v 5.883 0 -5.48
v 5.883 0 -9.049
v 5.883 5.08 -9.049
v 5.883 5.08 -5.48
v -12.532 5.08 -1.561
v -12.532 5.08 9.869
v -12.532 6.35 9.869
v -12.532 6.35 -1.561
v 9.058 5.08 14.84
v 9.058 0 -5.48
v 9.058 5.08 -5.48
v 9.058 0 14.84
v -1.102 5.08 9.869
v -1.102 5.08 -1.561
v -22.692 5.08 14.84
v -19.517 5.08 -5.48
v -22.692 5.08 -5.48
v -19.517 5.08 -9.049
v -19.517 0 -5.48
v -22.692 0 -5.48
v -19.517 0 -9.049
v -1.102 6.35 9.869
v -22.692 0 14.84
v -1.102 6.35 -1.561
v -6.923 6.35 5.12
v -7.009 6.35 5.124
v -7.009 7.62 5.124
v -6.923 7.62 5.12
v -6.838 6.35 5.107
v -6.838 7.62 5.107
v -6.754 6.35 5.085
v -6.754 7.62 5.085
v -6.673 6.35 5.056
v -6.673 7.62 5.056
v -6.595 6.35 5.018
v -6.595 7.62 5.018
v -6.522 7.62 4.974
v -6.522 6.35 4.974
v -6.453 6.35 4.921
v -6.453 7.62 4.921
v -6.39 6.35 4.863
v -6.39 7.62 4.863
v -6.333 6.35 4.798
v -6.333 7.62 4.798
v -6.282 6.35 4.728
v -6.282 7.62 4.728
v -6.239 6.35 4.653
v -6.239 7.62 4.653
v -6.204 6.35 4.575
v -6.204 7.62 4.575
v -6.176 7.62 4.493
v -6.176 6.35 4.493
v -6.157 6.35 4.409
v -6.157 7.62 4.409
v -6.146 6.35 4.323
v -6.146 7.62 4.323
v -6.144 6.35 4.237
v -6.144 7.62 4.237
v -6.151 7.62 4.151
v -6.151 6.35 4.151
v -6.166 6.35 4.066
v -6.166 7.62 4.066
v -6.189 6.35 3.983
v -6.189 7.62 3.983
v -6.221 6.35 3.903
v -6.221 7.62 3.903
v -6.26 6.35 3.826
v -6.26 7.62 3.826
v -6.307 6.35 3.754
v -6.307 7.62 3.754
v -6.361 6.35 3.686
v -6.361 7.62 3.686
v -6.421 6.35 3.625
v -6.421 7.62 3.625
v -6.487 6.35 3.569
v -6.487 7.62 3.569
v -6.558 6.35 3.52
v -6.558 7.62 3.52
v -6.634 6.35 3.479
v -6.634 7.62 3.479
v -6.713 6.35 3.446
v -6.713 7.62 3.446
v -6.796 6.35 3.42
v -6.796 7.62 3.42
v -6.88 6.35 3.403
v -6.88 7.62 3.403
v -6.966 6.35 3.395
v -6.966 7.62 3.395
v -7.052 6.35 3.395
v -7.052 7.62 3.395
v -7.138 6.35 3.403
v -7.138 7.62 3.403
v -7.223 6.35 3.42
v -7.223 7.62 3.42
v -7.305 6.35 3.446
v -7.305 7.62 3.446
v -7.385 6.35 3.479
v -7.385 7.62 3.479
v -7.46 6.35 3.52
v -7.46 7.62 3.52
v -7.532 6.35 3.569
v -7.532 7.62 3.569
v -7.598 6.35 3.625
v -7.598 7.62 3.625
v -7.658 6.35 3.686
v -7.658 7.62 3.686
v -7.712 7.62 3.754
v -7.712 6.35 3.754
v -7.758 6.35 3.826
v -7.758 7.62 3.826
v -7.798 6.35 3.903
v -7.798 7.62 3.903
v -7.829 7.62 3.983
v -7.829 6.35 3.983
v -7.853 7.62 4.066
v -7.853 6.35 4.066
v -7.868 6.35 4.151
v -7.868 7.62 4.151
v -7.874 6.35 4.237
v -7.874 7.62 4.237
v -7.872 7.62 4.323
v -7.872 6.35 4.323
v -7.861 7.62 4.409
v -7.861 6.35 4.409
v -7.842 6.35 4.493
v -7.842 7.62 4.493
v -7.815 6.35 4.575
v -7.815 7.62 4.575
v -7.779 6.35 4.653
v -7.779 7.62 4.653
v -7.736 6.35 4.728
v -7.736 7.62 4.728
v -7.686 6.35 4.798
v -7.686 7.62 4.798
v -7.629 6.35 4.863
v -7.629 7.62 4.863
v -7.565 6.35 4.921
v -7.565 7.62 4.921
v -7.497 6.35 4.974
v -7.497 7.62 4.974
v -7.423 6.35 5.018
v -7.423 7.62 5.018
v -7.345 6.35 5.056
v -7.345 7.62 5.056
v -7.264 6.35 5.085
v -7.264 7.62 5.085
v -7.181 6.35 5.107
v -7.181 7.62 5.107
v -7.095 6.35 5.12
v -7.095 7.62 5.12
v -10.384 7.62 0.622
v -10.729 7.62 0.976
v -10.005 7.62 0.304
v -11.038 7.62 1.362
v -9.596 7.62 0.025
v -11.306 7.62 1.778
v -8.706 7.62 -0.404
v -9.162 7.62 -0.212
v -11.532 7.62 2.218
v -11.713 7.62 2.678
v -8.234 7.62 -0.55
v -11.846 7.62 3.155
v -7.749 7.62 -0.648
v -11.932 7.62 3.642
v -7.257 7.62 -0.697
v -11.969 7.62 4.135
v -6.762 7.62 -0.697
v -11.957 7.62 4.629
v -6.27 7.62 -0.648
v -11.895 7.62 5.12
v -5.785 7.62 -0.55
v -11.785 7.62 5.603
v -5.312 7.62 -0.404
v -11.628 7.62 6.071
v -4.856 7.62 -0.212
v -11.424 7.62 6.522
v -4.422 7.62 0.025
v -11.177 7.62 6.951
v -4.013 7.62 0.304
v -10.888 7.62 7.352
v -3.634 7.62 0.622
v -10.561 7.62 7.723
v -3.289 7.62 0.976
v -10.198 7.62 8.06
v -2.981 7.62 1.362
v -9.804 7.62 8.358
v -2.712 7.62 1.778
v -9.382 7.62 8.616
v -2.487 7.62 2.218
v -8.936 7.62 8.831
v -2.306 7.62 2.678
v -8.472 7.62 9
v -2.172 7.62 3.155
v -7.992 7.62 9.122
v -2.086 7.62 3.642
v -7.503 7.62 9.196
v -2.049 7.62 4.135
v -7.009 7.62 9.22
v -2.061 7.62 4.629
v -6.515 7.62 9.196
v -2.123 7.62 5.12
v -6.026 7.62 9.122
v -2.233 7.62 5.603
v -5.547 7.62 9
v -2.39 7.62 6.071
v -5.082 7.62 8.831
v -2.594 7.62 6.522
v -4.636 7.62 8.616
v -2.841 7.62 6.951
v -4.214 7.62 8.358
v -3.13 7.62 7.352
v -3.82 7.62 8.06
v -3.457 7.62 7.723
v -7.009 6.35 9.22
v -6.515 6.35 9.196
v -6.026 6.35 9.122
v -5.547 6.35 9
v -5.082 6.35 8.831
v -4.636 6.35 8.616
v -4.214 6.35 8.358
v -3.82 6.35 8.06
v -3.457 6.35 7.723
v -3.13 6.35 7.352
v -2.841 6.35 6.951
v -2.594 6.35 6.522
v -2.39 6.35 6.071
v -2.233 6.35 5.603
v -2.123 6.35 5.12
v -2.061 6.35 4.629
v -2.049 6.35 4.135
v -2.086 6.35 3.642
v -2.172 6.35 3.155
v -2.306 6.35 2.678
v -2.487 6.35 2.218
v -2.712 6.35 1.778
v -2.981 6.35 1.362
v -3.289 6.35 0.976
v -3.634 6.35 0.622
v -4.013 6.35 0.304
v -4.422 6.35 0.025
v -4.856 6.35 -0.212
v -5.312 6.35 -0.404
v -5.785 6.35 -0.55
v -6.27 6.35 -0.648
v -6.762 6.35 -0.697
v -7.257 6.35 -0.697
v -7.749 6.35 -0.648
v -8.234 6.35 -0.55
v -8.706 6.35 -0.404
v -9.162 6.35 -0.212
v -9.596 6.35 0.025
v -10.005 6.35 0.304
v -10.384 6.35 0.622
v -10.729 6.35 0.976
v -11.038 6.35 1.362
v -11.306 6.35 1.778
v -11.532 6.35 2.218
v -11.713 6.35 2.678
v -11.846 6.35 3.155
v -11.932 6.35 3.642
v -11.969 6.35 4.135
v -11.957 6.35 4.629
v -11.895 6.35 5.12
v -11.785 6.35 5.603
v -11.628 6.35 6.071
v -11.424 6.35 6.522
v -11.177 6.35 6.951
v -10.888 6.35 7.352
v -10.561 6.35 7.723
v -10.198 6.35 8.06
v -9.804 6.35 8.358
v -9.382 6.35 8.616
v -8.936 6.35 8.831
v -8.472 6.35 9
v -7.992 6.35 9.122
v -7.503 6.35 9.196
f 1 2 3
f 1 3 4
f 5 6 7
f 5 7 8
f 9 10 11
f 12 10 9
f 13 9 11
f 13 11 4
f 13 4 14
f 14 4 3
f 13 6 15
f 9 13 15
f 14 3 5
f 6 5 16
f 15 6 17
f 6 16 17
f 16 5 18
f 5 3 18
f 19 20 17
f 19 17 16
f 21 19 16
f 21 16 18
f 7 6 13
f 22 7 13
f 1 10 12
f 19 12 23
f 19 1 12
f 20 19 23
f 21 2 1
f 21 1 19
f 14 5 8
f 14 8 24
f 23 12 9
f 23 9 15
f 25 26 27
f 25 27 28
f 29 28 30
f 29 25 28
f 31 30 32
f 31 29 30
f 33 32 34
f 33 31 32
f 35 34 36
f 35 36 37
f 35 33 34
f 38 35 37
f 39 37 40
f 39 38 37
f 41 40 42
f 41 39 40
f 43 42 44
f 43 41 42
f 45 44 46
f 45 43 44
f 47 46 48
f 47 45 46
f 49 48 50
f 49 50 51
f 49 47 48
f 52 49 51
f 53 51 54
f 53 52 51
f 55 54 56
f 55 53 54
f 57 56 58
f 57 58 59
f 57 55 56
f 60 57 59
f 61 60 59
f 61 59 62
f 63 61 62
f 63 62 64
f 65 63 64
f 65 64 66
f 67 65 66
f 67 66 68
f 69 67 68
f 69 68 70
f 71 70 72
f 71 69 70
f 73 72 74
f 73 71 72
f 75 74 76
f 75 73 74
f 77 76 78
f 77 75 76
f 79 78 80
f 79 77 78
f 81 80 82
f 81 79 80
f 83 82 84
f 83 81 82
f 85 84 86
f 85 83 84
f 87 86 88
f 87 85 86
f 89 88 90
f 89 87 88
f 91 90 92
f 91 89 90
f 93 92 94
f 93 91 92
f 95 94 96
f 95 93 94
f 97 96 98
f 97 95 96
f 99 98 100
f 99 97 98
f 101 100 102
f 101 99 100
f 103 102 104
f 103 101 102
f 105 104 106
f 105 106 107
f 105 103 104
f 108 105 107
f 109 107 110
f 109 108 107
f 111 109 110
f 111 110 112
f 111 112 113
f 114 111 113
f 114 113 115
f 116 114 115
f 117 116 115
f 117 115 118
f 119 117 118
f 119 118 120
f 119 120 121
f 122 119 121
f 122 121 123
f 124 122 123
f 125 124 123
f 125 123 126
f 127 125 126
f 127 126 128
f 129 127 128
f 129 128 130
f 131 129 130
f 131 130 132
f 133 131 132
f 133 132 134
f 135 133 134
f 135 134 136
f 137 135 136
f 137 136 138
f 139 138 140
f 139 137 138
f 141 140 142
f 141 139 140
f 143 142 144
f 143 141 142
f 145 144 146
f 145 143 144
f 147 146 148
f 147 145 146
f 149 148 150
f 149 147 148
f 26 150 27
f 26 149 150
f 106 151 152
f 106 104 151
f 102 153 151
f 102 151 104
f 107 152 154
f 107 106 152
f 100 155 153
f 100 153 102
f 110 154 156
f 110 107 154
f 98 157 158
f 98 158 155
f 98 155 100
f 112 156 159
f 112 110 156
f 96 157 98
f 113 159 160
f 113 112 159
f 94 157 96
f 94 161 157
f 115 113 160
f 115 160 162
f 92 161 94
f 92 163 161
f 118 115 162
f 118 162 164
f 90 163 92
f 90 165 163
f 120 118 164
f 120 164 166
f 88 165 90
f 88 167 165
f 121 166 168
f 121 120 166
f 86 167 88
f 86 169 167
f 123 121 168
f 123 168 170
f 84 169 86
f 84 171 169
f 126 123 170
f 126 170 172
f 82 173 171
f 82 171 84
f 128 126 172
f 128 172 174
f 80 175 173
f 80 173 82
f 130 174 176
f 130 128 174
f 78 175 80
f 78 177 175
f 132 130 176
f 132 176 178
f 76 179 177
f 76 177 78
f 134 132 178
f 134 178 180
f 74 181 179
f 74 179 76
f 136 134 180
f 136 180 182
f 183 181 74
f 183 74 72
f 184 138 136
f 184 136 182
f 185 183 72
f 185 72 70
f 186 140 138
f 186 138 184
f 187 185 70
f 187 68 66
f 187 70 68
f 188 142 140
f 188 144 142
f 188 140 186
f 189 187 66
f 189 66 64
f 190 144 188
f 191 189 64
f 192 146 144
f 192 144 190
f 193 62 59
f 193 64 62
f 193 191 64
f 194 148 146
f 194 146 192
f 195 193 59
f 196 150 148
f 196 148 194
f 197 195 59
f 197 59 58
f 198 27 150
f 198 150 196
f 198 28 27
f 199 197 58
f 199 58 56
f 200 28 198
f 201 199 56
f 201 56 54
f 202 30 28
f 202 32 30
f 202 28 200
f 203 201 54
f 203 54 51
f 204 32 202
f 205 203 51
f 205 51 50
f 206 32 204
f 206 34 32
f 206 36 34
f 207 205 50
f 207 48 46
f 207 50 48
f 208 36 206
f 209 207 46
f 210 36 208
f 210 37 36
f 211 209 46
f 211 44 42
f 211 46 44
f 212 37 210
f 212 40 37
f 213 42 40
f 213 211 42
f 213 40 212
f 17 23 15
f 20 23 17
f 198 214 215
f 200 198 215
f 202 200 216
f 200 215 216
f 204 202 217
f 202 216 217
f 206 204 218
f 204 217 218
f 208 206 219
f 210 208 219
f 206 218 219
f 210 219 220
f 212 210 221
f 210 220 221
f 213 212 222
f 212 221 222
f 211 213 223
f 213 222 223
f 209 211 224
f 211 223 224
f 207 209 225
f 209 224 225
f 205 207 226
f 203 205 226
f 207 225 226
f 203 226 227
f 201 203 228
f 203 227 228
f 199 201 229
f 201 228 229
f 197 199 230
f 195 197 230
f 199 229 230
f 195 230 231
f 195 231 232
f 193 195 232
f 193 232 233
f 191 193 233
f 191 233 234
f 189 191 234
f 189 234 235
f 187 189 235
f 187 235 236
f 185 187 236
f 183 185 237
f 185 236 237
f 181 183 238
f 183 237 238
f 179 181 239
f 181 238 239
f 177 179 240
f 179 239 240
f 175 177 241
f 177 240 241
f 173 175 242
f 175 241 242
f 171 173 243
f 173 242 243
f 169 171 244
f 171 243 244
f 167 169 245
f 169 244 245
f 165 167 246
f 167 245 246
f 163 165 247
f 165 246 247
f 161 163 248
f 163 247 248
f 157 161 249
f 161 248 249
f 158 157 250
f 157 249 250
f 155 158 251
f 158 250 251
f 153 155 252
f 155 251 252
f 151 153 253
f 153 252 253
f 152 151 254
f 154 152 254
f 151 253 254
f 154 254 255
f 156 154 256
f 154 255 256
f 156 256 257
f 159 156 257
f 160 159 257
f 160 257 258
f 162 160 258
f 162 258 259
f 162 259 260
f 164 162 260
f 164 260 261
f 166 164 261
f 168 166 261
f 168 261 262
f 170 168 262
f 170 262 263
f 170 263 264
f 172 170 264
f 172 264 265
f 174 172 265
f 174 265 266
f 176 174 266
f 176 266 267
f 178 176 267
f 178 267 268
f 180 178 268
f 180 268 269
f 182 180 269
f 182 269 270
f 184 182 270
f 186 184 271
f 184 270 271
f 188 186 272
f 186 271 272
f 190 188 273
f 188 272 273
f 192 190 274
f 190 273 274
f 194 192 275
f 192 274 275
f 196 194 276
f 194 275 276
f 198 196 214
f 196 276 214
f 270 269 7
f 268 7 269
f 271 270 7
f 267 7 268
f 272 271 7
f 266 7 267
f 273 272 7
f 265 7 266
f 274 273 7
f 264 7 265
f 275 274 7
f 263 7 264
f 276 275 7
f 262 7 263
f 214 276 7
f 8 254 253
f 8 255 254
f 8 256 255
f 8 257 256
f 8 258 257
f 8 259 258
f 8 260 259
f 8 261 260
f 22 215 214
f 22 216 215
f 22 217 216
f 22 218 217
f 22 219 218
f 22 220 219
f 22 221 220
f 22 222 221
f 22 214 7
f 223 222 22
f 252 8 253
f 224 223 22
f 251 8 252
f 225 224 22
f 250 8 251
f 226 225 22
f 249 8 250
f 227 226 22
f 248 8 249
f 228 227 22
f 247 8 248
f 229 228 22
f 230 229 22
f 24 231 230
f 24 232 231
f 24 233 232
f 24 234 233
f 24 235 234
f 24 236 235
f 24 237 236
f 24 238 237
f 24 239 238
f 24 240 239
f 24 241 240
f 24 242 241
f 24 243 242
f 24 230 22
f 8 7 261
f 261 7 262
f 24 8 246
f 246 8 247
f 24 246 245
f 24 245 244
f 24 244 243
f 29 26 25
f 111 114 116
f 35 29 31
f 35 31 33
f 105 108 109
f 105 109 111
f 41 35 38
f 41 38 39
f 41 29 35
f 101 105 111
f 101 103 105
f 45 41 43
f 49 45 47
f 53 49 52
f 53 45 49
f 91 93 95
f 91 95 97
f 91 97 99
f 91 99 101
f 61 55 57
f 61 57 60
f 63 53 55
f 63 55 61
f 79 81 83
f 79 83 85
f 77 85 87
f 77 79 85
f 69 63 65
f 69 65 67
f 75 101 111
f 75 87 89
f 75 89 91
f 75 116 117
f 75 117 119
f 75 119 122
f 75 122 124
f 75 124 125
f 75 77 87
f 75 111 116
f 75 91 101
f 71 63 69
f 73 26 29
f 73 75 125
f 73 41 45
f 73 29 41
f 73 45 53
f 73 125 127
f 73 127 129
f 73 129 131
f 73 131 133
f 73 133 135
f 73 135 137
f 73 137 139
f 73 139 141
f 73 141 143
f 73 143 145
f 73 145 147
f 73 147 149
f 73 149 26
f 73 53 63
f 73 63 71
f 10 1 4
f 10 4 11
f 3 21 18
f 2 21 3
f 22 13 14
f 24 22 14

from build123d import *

# Parameters (mm, degrees)
BOSS_EXTRUDE1_DEPTH = 5.08
SKETCH3_W           = 11.43
SKETCH3_H           = 11.43
BOSS_EXTRUDE2_DEPTH = 1.27
SKETCH5_R           = 4.961688794
SKETCH5_R_2         = 0.865135847
BOSS_EXTRUDE3_DEPTH = 1.27


with BuildPart() as part:
    # Sketch1 → Boss-Extrude1 (new body)
    with BuildSketch(Plane(origin=(0, 0, 0), x_dir=(1, 0, 0), z_dir=(0, 1, 0))):
        Polygon((-19.516726296, 9.048937426), (5.883273704, 9.048937426), (5.883273704, 5.480342385), (9.058273704, 5.480342385), (9.058273704, -14.839657615), (-22.691726296, -14.839657615), (-22.691726296, 5.480342385), (-19.516726296, 5.480342385), align=None)
    extrude(amount=BOSS_EXTRUDE1_DEPTH)

    # Sketch3 → Boss-Extrude2 (add)
    with BuildSketch(Plane(origin=(0, 5.08, 0), x_dir=(1, 0, 0), z_dir=(0, 1, 0))):
        with Locations((-6.816726296, -4.154305268)):
            Rectangle(SKETCH3_W, SKETCH3_H)
    extrude(amount=BOSS_EXTRUDE2_DEPTH)

    # Sketch5 → Boss-Extrude3 (add)
    with BuildSketch(Plane(origin=(0, 6.35, 0), x_dir=(1, 0, 0), z_dir=(0, 1, 0))):
        with Locations(Location((-7.009181054, -4.258692446, 0), (0, 0, 270))):
            Circle(SKETCH5_R)
        with Locations(Location((-7.009181054, -4.258692446, 0), (0, 0, 270))):
            Circle(SKETCH5_R_2, mode=Mode.SUBTRACT)
    extrude(amount=BOSS_EXTRUDE3_DEPTH)


solid = part.part
